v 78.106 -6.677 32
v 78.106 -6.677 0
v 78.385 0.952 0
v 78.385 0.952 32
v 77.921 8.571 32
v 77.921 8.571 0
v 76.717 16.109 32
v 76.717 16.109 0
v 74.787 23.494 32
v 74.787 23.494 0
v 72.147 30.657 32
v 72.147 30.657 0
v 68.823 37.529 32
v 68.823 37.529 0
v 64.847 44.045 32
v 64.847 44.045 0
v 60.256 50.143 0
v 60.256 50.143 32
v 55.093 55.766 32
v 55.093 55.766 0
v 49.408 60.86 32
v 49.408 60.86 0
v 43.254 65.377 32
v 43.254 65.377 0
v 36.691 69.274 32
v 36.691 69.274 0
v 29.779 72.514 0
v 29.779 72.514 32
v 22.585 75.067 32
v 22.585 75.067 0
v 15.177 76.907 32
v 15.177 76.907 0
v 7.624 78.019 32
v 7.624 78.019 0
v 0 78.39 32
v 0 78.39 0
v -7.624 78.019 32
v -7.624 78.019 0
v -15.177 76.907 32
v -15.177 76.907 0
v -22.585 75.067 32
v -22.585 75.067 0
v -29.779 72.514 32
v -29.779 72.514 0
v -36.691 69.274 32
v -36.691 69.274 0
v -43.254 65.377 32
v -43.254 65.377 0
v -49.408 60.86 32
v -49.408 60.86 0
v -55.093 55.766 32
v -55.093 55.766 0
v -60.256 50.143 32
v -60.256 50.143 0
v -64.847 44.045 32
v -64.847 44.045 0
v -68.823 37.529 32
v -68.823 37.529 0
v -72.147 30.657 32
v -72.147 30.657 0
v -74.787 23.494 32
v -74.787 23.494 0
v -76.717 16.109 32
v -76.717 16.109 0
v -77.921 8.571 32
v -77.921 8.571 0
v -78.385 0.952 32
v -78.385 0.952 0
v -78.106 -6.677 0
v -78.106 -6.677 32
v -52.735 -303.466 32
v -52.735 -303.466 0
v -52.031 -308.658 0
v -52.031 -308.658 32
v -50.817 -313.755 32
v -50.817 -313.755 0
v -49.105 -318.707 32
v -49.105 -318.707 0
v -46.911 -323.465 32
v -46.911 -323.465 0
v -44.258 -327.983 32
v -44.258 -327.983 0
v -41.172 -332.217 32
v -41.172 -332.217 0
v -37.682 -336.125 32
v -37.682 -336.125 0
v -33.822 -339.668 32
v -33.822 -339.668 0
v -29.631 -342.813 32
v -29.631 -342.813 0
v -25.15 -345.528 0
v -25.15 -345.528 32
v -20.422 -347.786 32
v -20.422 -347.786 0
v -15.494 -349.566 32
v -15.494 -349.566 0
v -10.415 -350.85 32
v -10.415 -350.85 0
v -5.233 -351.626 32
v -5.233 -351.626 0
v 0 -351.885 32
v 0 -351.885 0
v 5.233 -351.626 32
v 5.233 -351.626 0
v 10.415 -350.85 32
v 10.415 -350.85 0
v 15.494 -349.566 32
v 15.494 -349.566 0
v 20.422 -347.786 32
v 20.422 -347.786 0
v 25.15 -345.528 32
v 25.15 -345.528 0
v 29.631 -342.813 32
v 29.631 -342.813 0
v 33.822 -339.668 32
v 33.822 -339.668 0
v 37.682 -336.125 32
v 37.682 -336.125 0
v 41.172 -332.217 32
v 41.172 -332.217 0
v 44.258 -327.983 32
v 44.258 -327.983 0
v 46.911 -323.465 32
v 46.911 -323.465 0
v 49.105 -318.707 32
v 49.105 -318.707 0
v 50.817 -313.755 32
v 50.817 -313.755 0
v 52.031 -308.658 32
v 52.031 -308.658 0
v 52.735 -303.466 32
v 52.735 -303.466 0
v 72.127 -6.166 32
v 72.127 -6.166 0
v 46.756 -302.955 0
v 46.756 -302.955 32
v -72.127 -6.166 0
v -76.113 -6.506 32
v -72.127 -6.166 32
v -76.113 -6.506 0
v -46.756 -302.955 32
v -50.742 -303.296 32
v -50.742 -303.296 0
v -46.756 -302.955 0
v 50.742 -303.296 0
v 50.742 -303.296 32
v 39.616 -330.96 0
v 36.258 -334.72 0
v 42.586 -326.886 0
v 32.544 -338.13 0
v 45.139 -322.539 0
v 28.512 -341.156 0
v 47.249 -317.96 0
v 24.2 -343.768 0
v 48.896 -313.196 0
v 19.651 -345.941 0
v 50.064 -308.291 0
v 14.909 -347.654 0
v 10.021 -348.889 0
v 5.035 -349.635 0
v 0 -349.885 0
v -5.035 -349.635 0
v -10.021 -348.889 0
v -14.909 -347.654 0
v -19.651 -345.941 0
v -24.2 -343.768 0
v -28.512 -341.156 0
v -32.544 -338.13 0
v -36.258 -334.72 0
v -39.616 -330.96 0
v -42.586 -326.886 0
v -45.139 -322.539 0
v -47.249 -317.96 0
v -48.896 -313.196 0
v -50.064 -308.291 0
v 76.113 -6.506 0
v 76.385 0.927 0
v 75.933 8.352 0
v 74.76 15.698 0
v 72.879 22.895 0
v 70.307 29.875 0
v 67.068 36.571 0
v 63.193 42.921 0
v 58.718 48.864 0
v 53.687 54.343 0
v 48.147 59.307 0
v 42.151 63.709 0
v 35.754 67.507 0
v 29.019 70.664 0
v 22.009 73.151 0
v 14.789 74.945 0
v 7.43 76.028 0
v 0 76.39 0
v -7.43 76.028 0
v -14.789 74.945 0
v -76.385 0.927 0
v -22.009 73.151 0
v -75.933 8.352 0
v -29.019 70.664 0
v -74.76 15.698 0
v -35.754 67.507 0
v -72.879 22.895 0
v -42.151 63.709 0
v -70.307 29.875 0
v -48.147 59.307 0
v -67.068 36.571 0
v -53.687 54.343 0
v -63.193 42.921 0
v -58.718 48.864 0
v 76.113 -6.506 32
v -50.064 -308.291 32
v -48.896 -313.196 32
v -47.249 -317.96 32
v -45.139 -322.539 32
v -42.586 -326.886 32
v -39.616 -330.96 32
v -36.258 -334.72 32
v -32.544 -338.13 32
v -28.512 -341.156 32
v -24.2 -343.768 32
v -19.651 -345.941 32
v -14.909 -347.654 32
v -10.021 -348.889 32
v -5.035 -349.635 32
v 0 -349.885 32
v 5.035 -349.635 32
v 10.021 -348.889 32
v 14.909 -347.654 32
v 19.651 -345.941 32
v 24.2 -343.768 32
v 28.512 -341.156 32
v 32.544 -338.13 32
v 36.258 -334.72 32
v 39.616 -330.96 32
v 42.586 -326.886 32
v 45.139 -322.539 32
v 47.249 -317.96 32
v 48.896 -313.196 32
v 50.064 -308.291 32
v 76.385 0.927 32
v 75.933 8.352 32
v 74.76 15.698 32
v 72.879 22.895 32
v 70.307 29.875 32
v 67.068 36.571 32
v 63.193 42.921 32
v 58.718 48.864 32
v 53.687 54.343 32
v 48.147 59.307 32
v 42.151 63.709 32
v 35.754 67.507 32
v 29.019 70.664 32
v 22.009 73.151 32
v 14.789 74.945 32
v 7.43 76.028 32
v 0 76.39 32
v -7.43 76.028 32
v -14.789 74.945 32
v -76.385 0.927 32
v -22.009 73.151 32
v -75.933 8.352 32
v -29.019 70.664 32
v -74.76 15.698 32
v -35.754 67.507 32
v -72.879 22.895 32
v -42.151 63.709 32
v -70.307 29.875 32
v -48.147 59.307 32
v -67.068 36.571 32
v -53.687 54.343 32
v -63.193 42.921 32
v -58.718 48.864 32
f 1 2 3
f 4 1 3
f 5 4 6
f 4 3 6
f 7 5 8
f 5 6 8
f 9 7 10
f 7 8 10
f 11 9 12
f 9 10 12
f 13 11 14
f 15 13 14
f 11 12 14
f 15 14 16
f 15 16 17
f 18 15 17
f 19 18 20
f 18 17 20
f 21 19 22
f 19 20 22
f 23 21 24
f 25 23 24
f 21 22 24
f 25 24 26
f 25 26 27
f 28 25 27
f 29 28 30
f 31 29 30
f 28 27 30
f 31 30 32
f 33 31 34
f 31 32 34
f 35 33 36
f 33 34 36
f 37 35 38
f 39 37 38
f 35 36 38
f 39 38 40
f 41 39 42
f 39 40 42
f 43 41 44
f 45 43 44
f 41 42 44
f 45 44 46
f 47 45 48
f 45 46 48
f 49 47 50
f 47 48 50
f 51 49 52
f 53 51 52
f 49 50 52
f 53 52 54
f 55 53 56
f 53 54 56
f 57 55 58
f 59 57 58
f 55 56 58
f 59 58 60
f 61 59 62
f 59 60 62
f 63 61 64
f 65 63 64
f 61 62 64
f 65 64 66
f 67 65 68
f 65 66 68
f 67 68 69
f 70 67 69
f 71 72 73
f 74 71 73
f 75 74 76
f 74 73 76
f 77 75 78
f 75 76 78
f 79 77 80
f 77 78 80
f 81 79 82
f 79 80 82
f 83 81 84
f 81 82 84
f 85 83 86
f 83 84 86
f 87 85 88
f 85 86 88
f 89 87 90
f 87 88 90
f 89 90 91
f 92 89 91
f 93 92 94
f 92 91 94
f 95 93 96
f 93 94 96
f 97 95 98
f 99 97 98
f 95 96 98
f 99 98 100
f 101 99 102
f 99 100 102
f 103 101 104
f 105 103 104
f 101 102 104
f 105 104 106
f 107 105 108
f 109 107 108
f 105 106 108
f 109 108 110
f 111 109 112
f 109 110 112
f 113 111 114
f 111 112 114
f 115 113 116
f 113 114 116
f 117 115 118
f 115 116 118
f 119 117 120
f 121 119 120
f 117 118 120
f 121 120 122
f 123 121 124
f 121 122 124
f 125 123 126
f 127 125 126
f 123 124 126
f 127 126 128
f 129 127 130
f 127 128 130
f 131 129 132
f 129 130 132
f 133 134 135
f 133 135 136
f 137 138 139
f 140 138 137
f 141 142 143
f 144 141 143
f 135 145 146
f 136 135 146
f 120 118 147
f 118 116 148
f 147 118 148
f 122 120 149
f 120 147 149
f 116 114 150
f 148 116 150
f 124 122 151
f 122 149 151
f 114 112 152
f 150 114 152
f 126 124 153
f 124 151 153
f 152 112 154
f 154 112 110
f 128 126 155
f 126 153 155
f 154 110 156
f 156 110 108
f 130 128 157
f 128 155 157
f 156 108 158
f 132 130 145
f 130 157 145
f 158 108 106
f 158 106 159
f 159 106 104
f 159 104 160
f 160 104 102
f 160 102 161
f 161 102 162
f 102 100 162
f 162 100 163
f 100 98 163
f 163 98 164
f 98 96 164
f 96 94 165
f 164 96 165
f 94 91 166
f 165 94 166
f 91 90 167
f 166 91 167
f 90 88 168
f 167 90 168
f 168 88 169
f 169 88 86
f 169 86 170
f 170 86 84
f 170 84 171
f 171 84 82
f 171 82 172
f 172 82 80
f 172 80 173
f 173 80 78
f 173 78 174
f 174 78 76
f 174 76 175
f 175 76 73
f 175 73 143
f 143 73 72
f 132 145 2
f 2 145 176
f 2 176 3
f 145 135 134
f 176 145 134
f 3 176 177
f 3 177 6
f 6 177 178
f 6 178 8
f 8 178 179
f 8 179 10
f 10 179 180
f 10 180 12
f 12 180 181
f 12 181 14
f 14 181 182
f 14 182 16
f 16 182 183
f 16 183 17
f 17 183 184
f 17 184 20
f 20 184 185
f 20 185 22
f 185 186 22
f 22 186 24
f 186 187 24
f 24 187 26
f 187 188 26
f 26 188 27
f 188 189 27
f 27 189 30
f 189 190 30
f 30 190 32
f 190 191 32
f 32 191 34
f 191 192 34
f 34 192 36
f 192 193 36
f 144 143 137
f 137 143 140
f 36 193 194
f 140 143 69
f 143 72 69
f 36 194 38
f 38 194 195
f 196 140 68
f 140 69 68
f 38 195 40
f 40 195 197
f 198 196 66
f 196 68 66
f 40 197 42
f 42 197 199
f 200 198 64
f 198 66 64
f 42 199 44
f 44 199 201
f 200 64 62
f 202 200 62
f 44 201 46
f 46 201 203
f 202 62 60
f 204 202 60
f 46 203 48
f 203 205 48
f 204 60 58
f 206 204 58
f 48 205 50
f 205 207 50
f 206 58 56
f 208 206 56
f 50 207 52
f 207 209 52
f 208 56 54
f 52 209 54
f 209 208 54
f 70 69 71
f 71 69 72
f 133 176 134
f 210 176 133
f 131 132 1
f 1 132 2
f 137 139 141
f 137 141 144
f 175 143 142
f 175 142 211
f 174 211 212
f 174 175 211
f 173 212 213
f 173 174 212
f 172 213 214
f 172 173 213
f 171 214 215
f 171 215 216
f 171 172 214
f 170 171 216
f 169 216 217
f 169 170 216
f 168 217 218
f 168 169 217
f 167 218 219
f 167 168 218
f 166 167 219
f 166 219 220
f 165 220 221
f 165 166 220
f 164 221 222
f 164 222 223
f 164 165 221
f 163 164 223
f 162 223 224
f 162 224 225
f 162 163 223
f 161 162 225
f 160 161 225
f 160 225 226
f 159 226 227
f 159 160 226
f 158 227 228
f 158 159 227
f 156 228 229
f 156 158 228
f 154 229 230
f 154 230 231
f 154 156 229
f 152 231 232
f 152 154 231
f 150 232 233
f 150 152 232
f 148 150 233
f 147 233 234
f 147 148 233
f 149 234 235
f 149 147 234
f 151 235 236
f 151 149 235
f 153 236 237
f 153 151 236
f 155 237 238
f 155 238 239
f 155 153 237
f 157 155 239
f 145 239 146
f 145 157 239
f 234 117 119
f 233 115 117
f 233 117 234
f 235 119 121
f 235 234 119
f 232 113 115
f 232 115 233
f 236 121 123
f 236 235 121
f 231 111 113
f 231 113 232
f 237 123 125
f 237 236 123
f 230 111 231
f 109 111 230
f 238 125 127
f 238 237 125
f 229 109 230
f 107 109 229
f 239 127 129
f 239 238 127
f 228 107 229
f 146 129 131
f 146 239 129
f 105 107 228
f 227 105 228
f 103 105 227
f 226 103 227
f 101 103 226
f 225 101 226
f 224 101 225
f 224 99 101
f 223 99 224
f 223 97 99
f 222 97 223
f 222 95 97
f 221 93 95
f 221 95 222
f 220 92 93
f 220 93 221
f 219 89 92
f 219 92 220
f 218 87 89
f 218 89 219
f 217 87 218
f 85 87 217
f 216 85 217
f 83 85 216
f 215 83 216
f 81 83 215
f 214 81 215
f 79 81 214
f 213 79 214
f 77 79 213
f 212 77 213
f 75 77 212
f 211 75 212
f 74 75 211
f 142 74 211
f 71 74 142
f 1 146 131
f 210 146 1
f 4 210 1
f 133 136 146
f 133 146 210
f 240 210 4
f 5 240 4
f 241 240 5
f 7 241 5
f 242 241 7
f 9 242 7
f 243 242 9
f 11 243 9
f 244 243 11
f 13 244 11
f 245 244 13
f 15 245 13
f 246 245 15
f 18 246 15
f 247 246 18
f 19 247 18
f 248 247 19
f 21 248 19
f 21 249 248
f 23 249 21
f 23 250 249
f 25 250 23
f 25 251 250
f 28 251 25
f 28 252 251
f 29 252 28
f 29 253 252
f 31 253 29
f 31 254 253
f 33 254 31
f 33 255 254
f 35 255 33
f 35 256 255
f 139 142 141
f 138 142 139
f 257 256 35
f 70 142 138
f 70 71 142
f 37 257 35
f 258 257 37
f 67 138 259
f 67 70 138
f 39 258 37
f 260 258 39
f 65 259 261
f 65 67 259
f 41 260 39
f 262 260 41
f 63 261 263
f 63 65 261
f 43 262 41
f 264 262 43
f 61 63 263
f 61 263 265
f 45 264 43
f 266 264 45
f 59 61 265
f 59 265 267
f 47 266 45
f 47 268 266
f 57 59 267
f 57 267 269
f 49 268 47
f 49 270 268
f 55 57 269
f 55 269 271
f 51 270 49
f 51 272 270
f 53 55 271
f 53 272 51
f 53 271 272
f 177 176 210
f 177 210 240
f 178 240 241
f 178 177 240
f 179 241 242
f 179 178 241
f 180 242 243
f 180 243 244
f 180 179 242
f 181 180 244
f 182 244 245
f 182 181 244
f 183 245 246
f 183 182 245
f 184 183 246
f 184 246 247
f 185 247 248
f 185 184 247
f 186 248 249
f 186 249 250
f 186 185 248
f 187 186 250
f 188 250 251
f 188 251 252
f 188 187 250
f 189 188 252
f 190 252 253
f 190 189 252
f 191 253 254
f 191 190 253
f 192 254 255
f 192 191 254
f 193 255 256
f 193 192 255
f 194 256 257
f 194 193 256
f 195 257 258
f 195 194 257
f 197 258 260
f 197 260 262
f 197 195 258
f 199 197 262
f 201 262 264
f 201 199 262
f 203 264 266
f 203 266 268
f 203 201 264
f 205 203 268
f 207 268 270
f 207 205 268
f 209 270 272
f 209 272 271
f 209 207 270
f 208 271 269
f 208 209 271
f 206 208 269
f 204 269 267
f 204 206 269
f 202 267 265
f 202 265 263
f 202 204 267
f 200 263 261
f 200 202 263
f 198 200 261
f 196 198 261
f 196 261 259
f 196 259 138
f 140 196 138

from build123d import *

# Parameters (mm, degrees)
BOSS_EXTRUDE1_DEPTH = 32
SKETCH2_W           = 32
SKETCH2_H           = 297.871609812
BOSS_EXTRUDE2_DEPTH = 4
SKETCH3_W           = 32
SKETCH3_H           = 297.871609812
BOSS_EXTRUDE3_DEPTH = 4


with BuildPart() as part:
    # Sketch1 → Boss-Extrude1 (new body)
    with BuildSketch(Plane.XY):
        with BuildLine():
            Line((-78.105635002, -6.676845901), (-52.734667386, -303.466013381))
            ThreePointArc((-52.734667386, -303.466013381), (0, -351.885), (52.734667386, -303.466013381))
            Line((52.734667386, -303.466013381), (78.105635002, -6.676845901))
            ThreePointArc((78.105635002, -6.676845901), (0, 78.3905), (-78.105635002, -6.676845901))
        make_face()
        with BuildLine():
            Line((-76.112902847, -6.506497557), (-50.741935231, -303.295665038))
            ThreePointArc((-50.741935231, -303.295665038), (0, -349.885), (50.741935231, -303.295665038))
            Line((50.741935231, -303.295665038), (76.112902847, -6.506497557))
            ThreePointArc((76.112902847, -6.506497557), (0, 76.3905), (-76.112902847, -6.506497557))
        make_face(mode=Mode.SUBTRACT)
    extrude(amount=BOSS_EXTRUDE1_DEPTH)

    # Sketch2 → Boss-Extrude2 (add)
    with BuildSketch(Plane(origin=(76.112902847, -6.506497557, 0), x_dir=(0, 0, 1), z_dir=(-0.996366077547994, 0.08517417162276966, 0))):
        with Locations((16, -148.935804906)):
            Rectangle(SKETCH2_W, SKETCH2_H)
    extrude(amount=BOSS_EXTRUDE2_DEPTH)

    # Sketch3 → Boss-Extrude3 (add)
    with BuildSketch(Plane(origin=(-76.112902847, -6.506497557, 0), x_dir=(0, 0, -1), z_dir=(0.9963660775479939, 0.08517417162276988, 0))):
        with Locations((-16, -148.935804906)):
            Rectangle(SKETCH3_W, SKETCH3_H)
    extrude(amount=BOSS_EXTRUDE3_DEPTH)


solid = part.part
